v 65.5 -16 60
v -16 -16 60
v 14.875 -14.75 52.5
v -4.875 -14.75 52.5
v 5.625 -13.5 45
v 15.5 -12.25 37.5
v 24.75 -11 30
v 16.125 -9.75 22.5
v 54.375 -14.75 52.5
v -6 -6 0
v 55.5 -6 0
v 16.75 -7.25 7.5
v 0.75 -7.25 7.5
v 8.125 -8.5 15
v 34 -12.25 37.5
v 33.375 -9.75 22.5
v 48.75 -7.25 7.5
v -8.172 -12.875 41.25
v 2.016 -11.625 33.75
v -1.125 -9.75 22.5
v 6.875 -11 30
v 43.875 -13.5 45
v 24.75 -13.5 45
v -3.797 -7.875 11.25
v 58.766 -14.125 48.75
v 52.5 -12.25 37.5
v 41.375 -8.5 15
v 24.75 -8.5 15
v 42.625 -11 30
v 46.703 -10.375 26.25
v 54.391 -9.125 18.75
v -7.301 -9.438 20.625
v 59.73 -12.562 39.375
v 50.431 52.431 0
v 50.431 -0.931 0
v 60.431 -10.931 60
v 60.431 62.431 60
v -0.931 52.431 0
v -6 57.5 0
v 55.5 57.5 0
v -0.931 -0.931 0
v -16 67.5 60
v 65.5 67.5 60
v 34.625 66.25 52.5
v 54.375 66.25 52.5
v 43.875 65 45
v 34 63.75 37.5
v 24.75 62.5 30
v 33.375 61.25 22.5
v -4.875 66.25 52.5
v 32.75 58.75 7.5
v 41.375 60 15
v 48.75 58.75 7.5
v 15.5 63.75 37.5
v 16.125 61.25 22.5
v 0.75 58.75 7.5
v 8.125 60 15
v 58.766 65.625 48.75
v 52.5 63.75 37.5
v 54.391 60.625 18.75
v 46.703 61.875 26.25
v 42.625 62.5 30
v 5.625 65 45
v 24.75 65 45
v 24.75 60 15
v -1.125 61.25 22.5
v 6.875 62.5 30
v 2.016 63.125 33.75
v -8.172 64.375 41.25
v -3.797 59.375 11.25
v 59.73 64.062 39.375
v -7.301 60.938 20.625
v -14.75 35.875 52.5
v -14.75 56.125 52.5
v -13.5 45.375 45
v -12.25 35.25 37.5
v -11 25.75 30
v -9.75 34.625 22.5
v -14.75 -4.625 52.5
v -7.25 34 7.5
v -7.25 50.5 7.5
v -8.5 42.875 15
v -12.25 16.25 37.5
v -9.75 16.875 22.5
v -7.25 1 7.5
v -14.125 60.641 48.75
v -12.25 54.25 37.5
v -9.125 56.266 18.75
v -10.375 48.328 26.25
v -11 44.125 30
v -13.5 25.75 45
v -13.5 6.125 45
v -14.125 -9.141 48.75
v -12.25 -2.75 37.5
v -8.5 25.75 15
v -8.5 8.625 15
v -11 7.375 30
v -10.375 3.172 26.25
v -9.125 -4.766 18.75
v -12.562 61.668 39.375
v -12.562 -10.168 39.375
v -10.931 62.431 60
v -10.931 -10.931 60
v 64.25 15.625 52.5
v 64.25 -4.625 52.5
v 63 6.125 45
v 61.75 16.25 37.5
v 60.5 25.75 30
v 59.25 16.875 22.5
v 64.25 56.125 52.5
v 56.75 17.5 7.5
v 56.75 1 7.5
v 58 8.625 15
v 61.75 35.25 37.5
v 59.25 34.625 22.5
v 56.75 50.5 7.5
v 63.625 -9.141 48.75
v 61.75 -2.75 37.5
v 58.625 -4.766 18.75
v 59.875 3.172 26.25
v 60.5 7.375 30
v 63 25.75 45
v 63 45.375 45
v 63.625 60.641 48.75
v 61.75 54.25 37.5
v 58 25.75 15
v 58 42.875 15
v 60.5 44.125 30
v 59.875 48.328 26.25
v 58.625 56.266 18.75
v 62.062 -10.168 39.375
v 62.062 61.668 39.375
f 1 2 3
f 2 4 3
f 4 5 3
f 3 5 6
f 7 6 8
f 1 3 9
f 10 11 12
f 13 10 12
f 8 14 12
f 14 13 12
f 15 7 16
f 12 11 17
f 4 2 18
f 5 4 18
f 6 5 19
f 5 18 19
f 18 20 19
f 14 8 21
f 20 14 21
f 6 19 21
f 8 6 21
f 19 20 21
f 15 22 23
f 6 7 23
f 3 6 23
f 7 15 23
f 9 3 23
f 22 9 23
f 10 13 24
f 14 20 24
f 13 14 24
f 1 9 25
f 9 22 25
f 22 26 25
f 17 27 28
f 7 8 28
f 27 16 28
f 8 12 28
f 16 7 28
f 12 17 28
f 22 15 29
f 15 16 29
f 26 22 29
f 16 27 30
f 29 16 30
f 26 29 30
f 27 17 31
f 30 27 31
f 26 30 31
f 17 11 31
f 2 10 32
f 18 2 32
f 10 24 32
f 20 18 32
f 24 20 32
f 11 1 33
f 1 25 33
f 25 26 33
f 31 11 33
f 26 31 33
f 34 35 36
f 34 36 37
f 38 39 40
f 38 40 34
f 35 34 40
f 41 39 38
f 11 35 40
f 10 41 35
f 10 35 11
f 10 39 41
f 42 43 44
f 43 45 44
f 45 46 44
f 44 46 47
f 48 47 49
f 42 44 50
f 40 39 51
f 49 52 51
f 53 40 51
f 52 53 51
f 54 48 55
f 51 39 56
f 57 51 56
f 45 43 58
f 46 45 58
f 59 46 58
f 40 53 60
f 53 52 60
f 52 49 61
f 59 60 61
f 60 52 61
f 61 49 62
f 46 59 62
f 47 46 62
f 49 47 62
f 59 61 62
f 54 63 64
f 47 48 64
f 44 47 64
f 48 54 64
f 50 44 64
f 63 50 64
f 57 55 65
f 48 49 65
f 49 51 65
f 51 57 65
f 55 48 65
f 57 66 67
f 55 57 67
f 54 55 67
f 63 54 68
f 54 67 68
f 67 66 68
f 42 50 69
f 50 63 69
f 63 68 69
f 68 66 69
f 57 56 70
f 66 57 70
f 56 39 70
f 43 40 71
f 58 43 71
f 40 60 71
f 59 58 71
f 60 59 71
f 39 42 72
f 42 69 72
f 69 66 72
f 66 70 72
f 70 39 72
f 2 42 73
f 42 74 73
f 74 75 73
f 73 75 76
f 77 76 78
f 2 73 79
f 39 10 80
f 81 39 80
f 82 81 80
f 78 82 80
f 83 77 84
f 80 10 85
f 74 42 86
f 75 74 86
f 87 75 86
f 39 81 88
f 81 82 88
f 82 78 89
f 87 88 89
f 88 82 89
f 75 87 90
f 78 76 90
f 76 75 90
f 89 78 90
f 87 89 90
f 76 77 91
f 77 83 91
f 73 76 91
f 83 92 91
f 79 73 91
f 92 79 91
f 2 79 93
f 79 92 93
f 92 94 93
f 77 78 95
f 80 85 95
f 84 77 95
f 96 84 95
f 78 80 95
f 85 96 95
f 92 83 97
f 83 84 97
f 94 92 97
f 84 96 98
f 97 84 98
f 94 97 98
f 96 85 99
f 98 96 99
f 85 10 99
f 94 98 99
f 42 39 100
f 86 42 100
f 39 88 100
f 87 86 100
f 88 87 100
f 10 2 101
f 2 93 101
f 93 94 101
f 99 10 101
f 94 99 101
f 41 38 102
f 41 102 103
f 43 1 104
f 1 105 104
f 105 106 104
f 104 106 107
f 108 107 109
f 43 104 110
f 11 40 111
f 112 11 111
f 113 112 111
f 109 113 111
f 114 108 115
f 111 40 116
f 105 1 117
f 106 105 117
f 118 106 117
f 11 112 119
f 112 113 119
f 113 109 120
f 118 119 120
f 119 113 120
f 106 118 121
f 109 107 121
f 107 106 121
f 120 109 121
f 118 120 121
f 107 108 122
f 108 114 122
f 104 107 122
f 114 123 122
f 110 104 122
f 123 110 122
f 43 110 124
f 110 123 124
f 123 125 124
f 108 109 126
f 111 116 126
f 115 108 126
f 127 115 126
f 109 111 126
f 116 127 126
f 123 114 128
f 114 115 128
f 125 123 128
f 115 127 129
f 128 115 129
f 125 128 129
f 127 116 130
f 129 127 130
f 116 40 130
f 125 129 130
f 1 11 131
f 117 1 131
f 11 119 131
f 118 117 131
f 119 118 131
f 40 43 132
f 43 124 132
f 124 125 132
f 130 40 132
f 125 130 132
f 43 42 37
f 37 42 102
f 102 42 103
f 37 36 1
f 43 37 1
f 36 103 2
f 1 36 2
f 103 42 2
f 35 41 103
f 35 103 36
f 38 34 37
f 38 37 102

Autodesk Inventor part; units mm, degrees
ref_plane "YZ Plane" through (0, 0, 0) normal (1, 0, 0) x (0, 1, 0)
ref_plane "XZ Plane" through (0, 0, 0) normal (0, 1, 0) x (-1, 0, 0)
sketch "Sketch1" plane through (0, 0, 0) normal (0, 0, 1) x (1, 0, 0)
  line L0 (0, 0) -> (49.5, 0)
  line L1 (49.5, 0) -> (49.5, 51.5)
  line L2 (49.5, 51.5) -> (0, 51.5)
  line L3 (0, 51.5) -> (0, 0)
  line L4 (0, 51.5) -> (-6, 51.5)
  line L5 (-6, 51.5) -> (-6, 57.5)
  line L6 (49.5, 0) -> (55.5, 0)
  line L7 (55.5, 0) -> (55.5, -6)
  line L8 (-6, 57.5) -> (55.5, 57.5)
  line L9 (55.5, 57.5) -> (55.5, -6)
  line L10 (55.5, -6) -> (-6, -6)
  line L11 (-6, -6) -> (-6, 57.5)
  dimension "d0" = 49.5
  dimension "d1" = 51.5
  dimension "d2" = 6
  dimension "d3" = 6
  dimension "d4" = 6
  dimension "d5" = 6
ref_plane "Work Plane1" through (0, 0, 60) normal (0, 0, 1) x (1, 0, 0)
sketch "Sketch2" plane through (0, 0, 60) normal (0, 0, 1) x (1, 0, 0)
  line L0 (-6, 57.5) -> (55.5, 57.5) projected
  line L1 (-6, -6) -> (-6, 57.5) projected
  line L2 (55.5, -6) -> (-6, -6) projected
  line L3 (55.5, 0) -> (55.5, -6) projected
  line L4 (55.5, 57.5) -> (55.5, -6) projected
  line L5 (-6, 57.5) -> (-16, 57.5)
  line L6 (-16, 57.5) -> (-16, 67.5)
  line L7 (55.5, -6) -> (55.5, -16)
  line L8 (55.5, -16) -> (65.5, -16)
  line L9 (65.5, -16) -> (-16, -16)
  line L10 (-16, -16) -> (-16, 67.5)
  line L11 (-16, 67.5) -> (65.5, 67.5)
  line L12 (65.5, 67.5) -> (65.5, -16)
  point P0 (0, 0)
  point P1 (-6, 51.5)
  dimension "d7" = 10
  dimension "d8" = 10
  dimension "d9" = 10
  dimension "d10" = 10
loft "Loft1" add profiles "Sketch2", "Sketch1"
shell "Shell1" thickness 5 removed faces 2 at (11.1667, 11.8333, 60) at (14.5, 36.3333, 0)
properties part number "Antenna"
